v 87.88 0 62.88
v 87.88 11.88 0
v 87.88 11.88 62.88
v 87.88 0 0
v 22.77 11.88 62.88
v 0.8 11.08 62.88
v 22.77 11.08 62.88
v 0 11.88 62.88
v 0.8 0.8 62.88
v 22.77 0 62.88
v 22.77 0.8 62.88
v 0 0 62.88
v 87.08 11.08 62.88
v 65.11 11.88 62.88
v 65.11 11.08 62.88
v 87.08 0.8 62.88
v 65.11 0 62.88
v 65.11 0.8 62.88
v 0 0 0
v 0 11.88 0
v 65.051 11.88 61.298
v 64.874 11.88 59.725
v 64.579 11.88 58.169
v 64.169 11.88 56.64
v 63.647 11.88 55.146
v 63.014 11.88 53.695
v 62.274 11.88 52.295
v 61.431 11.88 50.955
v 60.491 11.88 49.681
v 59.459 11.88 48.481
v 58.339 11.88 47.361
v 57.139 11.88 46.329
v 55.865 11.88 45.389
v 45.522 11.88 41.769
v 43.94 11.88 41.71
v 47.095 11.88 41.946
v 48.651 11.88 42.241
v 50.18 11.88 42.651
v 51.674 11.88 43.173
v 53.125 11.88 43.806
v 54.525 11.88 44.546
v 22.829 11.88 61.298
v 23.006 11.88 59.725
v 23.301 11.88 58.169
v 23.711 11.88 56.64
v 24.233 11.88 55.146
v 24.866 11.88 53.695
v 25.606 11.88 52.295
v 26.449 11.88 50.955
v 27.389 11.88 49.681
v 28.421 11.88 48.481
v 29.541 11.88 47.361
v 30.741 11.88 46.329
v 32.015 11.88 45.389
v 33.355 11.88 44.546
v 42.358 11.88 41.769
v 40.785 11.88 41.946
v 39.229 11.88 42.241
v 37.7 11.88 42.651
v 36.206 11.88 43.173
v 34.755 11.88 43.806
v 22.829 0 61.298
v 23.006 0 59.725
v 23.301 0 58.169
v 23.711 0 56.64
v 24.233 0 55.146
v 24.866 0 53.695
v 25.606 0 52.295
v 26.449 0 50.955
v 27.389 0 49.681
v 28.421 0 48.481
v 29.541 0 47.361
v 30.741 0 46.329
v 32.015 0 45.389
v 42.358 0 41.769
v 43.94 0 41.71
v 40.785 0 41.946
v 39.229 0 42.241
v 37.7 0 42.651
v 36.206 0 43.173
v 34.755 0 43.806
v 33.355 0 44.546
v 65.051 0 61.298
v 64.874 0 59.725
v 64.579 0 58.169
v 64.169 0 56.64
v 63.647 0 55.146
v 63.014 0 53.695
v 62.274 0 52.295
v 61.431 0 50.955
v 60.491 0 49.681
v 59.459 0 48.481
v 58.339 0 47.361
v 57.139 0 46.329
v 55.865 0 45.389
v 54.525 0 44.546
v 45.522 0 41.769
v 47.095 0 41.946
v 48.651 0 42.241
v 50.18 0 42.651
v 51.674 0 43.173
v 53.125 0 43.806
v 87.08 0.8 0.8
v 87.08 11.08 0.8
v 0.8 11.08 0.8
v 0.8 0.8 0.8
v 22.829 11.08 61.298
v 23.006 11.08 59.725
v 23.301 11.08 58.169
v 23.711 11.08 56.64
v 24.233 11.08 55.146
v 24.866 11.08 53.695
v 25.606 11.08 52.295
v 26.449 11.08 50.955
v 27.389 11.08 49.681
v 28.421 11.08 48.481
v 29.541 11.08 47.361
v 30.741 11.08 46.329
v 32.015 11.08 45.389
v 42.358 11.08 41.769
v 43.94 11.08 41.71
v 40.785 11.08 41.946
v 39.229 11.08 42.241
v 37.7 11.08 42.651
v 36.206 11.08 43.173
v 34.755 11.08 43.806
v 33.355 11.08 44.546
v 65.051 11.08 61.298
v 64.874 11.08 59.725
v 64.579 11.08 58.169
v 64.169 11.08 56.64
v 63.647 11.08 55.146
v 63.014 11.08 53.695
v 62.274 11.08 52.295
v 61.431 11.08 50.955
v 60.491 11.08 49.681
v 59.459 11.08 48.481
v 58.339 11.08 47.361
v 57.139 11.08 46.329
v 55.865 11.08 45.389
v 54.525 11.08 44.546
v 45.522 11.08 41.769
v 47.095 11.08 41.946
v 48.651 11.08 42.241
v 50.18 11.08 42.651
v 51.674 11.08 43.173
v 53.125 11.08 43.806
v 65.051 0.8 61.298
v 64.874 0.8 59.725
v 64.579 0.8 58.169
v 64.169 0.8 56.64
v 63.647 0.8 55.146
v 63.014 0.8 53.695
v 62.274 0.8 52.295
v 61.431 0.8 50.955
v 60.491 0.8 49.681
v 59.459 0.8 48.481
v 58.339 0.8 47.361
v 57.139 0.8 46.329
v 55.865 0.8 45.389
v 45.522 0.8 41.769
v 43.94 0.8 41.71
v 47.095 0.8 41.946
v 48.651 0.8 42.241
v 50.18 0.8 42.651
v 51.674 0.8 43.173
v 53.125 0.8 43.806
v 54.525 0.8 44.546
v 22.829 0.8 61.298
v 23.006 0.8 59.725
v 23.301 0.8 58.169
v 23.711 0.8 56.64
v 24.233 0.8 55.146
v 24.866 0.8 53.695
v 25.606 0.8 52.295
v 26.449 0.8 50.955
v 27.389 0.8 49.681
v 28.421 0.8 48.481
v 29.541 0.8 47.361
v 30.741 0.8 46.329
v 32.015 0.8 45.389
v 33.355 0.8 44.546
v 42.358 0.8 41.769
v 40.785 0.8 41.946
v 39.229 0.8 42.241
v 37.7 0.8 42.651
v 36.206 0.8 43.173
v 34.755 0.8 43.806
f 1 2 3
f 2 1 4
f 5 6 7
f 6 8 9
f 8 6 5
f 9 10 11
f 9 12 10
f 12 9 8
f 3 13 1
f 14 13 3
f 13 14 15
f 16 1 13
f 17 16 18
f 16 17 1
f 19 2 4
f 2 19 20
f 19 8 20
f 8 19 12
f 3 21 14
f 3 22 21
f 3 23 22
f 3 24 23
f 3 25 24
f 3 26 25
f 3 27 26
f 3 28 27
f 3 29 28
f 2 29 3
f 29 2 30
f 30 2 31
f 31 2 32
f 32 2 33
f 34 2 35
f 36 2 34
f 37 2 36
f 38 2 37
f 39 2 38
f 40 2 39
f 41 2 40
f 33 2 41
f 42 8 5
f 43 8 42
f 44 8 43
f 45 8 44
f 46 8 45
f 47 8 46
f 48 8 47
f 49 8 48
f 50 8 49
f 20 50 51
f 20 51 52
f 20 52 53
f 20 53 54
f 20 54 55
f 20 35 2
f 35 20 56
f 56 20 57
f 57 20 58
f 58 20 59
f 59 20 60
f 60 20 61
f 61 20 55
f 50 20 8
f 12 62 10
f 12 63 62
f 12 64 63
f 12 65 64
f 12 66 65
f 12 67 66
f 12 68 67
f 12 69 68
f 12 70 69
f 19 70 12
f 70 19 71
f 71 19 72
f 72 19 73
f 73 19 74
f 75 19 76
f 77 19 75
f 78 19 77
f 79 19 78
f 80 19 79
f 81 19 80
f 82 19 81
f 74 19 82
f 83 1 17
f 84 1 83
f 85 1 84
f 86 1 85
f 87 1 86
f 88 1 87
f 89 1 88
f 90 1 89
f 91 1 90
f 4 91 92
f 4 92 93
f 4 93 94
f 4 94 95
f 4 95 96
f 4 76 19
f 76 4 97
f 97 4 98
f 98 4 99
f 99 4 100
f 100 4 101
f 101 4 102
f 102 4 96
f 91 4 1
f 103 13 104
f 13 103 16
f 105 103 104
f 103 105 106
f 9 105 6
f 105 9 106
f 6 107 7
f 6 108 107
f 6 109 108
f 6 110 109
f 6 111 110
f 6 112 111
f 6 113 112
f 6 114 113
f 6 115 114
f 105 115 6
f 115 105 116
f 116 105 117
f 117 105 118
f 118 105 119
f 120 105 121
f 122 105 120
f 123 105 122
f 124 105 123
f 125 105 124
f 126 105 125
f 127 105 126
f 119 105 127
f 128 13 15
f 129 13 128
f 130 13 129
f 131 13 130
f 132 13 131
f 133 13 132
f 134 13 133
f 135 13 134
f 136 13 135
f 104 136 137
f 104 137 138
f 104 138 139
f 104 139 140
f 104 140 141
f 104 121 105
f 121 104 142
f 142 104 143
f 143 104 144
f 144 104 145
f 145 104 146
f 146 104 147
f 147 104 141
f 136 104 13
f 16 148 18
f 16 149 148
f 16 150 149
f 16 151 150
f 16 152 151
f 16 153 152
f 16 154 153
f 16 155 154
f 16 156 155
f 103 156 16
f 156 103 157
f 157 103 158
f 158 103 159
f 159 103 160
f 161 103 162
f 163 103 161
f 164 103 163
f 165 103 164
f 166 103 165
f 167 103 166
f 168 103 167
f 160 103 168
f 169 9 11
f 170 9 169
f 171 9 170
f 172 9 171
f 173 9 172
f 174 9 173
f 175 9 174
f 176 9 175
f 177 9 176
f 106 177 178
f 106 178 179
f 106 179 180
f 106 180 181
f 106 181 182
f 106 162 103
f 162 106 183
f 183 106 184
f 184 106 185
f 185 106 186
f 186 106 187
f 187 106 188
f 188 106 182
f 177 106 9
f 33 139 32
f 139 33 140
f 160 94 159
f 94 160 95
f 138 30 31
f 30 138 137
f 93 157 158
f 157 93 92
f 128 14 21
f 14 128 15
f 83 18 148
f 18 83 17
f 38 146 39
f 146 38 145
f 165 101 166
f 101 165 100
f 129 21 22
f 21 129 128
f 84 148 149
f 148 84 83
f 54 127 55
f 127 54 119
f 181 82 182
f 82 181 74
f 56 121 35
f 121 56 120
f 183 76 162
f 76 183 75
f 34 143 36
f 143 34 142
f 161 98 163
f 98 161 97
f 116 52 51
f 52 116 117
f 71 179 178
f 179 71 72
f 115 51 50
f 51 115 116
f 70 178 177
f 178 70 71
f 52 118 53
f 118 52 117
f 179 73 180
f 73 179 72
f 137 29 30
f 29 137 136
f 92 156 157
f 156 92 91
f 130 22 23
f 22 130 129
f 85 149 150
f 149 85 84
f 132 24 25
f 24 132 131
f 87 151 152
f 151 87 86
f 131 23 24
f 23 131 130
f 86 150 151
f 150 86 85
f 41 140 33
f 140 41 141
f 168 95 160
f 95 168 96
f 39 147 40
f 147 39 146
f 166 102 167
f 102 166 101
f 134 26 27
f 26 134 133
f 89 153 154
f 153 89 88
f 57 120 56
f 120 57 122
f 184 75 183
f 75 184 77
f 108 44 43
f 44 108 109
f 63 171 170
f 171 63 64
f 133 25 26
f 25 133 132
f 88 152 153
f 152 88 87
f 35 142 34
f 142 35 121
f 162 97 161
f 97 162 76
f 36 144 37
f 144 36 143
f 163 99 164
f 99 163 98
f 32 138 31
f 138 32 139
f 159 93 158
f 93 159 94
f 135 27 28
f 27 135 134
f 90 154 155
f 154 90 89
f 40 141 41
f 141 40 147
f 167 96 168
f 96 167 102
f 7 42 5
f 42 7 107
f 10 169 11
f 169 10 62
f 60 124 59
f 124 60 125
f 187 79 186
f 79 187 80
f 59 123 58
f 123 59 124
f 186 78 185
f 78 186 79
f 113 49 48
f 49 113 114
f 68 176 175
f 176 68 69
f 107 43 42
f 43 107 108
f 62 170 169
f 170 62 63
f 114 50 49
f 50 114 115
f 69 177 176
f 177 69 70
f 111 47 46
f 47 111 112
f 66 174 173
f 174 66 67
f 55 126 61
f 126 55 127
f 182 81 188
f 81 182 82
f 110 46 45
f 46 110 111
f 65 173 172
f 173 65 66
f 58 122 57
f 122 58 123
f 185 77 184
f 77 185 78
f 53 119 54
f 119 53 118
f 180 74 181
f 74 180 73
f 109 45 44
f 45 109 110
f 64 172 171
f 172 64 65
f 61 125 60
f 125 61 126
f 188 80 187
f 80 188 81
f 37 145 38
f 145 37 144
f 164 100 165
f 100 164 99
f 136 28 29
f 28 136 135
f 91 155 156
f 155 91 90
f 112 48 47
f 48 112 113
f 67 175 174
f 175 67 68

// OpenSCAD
walls = 2;
layer_width = 0.4;

thickness = walls * layer_width;
clearance = 0.07;
loose_clearance = 0.14;

//deck_size = [63, 89, 38]; // Star Realms
//deck_size = [61, 104, 10]; // german-suited
deck_size = [61, 86, 10]; // minecraft dungeons

card_width = deck_size[0];
card_height = deck_size[1];
deck_height = deck_size[2];

outside_box = [
  card_height + loose_clearance * 2 + thickness * 2,
  deck_height + loose_clearance * 2 + thickness * 2,
  card_width + loose_clearance * 2 + thickness * 2
];

module box() {
  inside_box = [
    card_height + loose_clearance * 2,
    deck_height + loose_clearance * 2,
    card_width + loose_clearance * 2 + thickness + 1,
  ];
  
  difference() {
    cube(outside_box);
    translate([thickness, thickness, thickness])
      cube(inside_box);
  translate([outside_box[0] / 2, -1, outside_box[2]])
      rotate([-90, 0, 0])
        cylinder(h = outside_box[1] + 2, d = outside_box[0] / 2 - thickness * 2, $fn = 84);  
  }
}

box();
